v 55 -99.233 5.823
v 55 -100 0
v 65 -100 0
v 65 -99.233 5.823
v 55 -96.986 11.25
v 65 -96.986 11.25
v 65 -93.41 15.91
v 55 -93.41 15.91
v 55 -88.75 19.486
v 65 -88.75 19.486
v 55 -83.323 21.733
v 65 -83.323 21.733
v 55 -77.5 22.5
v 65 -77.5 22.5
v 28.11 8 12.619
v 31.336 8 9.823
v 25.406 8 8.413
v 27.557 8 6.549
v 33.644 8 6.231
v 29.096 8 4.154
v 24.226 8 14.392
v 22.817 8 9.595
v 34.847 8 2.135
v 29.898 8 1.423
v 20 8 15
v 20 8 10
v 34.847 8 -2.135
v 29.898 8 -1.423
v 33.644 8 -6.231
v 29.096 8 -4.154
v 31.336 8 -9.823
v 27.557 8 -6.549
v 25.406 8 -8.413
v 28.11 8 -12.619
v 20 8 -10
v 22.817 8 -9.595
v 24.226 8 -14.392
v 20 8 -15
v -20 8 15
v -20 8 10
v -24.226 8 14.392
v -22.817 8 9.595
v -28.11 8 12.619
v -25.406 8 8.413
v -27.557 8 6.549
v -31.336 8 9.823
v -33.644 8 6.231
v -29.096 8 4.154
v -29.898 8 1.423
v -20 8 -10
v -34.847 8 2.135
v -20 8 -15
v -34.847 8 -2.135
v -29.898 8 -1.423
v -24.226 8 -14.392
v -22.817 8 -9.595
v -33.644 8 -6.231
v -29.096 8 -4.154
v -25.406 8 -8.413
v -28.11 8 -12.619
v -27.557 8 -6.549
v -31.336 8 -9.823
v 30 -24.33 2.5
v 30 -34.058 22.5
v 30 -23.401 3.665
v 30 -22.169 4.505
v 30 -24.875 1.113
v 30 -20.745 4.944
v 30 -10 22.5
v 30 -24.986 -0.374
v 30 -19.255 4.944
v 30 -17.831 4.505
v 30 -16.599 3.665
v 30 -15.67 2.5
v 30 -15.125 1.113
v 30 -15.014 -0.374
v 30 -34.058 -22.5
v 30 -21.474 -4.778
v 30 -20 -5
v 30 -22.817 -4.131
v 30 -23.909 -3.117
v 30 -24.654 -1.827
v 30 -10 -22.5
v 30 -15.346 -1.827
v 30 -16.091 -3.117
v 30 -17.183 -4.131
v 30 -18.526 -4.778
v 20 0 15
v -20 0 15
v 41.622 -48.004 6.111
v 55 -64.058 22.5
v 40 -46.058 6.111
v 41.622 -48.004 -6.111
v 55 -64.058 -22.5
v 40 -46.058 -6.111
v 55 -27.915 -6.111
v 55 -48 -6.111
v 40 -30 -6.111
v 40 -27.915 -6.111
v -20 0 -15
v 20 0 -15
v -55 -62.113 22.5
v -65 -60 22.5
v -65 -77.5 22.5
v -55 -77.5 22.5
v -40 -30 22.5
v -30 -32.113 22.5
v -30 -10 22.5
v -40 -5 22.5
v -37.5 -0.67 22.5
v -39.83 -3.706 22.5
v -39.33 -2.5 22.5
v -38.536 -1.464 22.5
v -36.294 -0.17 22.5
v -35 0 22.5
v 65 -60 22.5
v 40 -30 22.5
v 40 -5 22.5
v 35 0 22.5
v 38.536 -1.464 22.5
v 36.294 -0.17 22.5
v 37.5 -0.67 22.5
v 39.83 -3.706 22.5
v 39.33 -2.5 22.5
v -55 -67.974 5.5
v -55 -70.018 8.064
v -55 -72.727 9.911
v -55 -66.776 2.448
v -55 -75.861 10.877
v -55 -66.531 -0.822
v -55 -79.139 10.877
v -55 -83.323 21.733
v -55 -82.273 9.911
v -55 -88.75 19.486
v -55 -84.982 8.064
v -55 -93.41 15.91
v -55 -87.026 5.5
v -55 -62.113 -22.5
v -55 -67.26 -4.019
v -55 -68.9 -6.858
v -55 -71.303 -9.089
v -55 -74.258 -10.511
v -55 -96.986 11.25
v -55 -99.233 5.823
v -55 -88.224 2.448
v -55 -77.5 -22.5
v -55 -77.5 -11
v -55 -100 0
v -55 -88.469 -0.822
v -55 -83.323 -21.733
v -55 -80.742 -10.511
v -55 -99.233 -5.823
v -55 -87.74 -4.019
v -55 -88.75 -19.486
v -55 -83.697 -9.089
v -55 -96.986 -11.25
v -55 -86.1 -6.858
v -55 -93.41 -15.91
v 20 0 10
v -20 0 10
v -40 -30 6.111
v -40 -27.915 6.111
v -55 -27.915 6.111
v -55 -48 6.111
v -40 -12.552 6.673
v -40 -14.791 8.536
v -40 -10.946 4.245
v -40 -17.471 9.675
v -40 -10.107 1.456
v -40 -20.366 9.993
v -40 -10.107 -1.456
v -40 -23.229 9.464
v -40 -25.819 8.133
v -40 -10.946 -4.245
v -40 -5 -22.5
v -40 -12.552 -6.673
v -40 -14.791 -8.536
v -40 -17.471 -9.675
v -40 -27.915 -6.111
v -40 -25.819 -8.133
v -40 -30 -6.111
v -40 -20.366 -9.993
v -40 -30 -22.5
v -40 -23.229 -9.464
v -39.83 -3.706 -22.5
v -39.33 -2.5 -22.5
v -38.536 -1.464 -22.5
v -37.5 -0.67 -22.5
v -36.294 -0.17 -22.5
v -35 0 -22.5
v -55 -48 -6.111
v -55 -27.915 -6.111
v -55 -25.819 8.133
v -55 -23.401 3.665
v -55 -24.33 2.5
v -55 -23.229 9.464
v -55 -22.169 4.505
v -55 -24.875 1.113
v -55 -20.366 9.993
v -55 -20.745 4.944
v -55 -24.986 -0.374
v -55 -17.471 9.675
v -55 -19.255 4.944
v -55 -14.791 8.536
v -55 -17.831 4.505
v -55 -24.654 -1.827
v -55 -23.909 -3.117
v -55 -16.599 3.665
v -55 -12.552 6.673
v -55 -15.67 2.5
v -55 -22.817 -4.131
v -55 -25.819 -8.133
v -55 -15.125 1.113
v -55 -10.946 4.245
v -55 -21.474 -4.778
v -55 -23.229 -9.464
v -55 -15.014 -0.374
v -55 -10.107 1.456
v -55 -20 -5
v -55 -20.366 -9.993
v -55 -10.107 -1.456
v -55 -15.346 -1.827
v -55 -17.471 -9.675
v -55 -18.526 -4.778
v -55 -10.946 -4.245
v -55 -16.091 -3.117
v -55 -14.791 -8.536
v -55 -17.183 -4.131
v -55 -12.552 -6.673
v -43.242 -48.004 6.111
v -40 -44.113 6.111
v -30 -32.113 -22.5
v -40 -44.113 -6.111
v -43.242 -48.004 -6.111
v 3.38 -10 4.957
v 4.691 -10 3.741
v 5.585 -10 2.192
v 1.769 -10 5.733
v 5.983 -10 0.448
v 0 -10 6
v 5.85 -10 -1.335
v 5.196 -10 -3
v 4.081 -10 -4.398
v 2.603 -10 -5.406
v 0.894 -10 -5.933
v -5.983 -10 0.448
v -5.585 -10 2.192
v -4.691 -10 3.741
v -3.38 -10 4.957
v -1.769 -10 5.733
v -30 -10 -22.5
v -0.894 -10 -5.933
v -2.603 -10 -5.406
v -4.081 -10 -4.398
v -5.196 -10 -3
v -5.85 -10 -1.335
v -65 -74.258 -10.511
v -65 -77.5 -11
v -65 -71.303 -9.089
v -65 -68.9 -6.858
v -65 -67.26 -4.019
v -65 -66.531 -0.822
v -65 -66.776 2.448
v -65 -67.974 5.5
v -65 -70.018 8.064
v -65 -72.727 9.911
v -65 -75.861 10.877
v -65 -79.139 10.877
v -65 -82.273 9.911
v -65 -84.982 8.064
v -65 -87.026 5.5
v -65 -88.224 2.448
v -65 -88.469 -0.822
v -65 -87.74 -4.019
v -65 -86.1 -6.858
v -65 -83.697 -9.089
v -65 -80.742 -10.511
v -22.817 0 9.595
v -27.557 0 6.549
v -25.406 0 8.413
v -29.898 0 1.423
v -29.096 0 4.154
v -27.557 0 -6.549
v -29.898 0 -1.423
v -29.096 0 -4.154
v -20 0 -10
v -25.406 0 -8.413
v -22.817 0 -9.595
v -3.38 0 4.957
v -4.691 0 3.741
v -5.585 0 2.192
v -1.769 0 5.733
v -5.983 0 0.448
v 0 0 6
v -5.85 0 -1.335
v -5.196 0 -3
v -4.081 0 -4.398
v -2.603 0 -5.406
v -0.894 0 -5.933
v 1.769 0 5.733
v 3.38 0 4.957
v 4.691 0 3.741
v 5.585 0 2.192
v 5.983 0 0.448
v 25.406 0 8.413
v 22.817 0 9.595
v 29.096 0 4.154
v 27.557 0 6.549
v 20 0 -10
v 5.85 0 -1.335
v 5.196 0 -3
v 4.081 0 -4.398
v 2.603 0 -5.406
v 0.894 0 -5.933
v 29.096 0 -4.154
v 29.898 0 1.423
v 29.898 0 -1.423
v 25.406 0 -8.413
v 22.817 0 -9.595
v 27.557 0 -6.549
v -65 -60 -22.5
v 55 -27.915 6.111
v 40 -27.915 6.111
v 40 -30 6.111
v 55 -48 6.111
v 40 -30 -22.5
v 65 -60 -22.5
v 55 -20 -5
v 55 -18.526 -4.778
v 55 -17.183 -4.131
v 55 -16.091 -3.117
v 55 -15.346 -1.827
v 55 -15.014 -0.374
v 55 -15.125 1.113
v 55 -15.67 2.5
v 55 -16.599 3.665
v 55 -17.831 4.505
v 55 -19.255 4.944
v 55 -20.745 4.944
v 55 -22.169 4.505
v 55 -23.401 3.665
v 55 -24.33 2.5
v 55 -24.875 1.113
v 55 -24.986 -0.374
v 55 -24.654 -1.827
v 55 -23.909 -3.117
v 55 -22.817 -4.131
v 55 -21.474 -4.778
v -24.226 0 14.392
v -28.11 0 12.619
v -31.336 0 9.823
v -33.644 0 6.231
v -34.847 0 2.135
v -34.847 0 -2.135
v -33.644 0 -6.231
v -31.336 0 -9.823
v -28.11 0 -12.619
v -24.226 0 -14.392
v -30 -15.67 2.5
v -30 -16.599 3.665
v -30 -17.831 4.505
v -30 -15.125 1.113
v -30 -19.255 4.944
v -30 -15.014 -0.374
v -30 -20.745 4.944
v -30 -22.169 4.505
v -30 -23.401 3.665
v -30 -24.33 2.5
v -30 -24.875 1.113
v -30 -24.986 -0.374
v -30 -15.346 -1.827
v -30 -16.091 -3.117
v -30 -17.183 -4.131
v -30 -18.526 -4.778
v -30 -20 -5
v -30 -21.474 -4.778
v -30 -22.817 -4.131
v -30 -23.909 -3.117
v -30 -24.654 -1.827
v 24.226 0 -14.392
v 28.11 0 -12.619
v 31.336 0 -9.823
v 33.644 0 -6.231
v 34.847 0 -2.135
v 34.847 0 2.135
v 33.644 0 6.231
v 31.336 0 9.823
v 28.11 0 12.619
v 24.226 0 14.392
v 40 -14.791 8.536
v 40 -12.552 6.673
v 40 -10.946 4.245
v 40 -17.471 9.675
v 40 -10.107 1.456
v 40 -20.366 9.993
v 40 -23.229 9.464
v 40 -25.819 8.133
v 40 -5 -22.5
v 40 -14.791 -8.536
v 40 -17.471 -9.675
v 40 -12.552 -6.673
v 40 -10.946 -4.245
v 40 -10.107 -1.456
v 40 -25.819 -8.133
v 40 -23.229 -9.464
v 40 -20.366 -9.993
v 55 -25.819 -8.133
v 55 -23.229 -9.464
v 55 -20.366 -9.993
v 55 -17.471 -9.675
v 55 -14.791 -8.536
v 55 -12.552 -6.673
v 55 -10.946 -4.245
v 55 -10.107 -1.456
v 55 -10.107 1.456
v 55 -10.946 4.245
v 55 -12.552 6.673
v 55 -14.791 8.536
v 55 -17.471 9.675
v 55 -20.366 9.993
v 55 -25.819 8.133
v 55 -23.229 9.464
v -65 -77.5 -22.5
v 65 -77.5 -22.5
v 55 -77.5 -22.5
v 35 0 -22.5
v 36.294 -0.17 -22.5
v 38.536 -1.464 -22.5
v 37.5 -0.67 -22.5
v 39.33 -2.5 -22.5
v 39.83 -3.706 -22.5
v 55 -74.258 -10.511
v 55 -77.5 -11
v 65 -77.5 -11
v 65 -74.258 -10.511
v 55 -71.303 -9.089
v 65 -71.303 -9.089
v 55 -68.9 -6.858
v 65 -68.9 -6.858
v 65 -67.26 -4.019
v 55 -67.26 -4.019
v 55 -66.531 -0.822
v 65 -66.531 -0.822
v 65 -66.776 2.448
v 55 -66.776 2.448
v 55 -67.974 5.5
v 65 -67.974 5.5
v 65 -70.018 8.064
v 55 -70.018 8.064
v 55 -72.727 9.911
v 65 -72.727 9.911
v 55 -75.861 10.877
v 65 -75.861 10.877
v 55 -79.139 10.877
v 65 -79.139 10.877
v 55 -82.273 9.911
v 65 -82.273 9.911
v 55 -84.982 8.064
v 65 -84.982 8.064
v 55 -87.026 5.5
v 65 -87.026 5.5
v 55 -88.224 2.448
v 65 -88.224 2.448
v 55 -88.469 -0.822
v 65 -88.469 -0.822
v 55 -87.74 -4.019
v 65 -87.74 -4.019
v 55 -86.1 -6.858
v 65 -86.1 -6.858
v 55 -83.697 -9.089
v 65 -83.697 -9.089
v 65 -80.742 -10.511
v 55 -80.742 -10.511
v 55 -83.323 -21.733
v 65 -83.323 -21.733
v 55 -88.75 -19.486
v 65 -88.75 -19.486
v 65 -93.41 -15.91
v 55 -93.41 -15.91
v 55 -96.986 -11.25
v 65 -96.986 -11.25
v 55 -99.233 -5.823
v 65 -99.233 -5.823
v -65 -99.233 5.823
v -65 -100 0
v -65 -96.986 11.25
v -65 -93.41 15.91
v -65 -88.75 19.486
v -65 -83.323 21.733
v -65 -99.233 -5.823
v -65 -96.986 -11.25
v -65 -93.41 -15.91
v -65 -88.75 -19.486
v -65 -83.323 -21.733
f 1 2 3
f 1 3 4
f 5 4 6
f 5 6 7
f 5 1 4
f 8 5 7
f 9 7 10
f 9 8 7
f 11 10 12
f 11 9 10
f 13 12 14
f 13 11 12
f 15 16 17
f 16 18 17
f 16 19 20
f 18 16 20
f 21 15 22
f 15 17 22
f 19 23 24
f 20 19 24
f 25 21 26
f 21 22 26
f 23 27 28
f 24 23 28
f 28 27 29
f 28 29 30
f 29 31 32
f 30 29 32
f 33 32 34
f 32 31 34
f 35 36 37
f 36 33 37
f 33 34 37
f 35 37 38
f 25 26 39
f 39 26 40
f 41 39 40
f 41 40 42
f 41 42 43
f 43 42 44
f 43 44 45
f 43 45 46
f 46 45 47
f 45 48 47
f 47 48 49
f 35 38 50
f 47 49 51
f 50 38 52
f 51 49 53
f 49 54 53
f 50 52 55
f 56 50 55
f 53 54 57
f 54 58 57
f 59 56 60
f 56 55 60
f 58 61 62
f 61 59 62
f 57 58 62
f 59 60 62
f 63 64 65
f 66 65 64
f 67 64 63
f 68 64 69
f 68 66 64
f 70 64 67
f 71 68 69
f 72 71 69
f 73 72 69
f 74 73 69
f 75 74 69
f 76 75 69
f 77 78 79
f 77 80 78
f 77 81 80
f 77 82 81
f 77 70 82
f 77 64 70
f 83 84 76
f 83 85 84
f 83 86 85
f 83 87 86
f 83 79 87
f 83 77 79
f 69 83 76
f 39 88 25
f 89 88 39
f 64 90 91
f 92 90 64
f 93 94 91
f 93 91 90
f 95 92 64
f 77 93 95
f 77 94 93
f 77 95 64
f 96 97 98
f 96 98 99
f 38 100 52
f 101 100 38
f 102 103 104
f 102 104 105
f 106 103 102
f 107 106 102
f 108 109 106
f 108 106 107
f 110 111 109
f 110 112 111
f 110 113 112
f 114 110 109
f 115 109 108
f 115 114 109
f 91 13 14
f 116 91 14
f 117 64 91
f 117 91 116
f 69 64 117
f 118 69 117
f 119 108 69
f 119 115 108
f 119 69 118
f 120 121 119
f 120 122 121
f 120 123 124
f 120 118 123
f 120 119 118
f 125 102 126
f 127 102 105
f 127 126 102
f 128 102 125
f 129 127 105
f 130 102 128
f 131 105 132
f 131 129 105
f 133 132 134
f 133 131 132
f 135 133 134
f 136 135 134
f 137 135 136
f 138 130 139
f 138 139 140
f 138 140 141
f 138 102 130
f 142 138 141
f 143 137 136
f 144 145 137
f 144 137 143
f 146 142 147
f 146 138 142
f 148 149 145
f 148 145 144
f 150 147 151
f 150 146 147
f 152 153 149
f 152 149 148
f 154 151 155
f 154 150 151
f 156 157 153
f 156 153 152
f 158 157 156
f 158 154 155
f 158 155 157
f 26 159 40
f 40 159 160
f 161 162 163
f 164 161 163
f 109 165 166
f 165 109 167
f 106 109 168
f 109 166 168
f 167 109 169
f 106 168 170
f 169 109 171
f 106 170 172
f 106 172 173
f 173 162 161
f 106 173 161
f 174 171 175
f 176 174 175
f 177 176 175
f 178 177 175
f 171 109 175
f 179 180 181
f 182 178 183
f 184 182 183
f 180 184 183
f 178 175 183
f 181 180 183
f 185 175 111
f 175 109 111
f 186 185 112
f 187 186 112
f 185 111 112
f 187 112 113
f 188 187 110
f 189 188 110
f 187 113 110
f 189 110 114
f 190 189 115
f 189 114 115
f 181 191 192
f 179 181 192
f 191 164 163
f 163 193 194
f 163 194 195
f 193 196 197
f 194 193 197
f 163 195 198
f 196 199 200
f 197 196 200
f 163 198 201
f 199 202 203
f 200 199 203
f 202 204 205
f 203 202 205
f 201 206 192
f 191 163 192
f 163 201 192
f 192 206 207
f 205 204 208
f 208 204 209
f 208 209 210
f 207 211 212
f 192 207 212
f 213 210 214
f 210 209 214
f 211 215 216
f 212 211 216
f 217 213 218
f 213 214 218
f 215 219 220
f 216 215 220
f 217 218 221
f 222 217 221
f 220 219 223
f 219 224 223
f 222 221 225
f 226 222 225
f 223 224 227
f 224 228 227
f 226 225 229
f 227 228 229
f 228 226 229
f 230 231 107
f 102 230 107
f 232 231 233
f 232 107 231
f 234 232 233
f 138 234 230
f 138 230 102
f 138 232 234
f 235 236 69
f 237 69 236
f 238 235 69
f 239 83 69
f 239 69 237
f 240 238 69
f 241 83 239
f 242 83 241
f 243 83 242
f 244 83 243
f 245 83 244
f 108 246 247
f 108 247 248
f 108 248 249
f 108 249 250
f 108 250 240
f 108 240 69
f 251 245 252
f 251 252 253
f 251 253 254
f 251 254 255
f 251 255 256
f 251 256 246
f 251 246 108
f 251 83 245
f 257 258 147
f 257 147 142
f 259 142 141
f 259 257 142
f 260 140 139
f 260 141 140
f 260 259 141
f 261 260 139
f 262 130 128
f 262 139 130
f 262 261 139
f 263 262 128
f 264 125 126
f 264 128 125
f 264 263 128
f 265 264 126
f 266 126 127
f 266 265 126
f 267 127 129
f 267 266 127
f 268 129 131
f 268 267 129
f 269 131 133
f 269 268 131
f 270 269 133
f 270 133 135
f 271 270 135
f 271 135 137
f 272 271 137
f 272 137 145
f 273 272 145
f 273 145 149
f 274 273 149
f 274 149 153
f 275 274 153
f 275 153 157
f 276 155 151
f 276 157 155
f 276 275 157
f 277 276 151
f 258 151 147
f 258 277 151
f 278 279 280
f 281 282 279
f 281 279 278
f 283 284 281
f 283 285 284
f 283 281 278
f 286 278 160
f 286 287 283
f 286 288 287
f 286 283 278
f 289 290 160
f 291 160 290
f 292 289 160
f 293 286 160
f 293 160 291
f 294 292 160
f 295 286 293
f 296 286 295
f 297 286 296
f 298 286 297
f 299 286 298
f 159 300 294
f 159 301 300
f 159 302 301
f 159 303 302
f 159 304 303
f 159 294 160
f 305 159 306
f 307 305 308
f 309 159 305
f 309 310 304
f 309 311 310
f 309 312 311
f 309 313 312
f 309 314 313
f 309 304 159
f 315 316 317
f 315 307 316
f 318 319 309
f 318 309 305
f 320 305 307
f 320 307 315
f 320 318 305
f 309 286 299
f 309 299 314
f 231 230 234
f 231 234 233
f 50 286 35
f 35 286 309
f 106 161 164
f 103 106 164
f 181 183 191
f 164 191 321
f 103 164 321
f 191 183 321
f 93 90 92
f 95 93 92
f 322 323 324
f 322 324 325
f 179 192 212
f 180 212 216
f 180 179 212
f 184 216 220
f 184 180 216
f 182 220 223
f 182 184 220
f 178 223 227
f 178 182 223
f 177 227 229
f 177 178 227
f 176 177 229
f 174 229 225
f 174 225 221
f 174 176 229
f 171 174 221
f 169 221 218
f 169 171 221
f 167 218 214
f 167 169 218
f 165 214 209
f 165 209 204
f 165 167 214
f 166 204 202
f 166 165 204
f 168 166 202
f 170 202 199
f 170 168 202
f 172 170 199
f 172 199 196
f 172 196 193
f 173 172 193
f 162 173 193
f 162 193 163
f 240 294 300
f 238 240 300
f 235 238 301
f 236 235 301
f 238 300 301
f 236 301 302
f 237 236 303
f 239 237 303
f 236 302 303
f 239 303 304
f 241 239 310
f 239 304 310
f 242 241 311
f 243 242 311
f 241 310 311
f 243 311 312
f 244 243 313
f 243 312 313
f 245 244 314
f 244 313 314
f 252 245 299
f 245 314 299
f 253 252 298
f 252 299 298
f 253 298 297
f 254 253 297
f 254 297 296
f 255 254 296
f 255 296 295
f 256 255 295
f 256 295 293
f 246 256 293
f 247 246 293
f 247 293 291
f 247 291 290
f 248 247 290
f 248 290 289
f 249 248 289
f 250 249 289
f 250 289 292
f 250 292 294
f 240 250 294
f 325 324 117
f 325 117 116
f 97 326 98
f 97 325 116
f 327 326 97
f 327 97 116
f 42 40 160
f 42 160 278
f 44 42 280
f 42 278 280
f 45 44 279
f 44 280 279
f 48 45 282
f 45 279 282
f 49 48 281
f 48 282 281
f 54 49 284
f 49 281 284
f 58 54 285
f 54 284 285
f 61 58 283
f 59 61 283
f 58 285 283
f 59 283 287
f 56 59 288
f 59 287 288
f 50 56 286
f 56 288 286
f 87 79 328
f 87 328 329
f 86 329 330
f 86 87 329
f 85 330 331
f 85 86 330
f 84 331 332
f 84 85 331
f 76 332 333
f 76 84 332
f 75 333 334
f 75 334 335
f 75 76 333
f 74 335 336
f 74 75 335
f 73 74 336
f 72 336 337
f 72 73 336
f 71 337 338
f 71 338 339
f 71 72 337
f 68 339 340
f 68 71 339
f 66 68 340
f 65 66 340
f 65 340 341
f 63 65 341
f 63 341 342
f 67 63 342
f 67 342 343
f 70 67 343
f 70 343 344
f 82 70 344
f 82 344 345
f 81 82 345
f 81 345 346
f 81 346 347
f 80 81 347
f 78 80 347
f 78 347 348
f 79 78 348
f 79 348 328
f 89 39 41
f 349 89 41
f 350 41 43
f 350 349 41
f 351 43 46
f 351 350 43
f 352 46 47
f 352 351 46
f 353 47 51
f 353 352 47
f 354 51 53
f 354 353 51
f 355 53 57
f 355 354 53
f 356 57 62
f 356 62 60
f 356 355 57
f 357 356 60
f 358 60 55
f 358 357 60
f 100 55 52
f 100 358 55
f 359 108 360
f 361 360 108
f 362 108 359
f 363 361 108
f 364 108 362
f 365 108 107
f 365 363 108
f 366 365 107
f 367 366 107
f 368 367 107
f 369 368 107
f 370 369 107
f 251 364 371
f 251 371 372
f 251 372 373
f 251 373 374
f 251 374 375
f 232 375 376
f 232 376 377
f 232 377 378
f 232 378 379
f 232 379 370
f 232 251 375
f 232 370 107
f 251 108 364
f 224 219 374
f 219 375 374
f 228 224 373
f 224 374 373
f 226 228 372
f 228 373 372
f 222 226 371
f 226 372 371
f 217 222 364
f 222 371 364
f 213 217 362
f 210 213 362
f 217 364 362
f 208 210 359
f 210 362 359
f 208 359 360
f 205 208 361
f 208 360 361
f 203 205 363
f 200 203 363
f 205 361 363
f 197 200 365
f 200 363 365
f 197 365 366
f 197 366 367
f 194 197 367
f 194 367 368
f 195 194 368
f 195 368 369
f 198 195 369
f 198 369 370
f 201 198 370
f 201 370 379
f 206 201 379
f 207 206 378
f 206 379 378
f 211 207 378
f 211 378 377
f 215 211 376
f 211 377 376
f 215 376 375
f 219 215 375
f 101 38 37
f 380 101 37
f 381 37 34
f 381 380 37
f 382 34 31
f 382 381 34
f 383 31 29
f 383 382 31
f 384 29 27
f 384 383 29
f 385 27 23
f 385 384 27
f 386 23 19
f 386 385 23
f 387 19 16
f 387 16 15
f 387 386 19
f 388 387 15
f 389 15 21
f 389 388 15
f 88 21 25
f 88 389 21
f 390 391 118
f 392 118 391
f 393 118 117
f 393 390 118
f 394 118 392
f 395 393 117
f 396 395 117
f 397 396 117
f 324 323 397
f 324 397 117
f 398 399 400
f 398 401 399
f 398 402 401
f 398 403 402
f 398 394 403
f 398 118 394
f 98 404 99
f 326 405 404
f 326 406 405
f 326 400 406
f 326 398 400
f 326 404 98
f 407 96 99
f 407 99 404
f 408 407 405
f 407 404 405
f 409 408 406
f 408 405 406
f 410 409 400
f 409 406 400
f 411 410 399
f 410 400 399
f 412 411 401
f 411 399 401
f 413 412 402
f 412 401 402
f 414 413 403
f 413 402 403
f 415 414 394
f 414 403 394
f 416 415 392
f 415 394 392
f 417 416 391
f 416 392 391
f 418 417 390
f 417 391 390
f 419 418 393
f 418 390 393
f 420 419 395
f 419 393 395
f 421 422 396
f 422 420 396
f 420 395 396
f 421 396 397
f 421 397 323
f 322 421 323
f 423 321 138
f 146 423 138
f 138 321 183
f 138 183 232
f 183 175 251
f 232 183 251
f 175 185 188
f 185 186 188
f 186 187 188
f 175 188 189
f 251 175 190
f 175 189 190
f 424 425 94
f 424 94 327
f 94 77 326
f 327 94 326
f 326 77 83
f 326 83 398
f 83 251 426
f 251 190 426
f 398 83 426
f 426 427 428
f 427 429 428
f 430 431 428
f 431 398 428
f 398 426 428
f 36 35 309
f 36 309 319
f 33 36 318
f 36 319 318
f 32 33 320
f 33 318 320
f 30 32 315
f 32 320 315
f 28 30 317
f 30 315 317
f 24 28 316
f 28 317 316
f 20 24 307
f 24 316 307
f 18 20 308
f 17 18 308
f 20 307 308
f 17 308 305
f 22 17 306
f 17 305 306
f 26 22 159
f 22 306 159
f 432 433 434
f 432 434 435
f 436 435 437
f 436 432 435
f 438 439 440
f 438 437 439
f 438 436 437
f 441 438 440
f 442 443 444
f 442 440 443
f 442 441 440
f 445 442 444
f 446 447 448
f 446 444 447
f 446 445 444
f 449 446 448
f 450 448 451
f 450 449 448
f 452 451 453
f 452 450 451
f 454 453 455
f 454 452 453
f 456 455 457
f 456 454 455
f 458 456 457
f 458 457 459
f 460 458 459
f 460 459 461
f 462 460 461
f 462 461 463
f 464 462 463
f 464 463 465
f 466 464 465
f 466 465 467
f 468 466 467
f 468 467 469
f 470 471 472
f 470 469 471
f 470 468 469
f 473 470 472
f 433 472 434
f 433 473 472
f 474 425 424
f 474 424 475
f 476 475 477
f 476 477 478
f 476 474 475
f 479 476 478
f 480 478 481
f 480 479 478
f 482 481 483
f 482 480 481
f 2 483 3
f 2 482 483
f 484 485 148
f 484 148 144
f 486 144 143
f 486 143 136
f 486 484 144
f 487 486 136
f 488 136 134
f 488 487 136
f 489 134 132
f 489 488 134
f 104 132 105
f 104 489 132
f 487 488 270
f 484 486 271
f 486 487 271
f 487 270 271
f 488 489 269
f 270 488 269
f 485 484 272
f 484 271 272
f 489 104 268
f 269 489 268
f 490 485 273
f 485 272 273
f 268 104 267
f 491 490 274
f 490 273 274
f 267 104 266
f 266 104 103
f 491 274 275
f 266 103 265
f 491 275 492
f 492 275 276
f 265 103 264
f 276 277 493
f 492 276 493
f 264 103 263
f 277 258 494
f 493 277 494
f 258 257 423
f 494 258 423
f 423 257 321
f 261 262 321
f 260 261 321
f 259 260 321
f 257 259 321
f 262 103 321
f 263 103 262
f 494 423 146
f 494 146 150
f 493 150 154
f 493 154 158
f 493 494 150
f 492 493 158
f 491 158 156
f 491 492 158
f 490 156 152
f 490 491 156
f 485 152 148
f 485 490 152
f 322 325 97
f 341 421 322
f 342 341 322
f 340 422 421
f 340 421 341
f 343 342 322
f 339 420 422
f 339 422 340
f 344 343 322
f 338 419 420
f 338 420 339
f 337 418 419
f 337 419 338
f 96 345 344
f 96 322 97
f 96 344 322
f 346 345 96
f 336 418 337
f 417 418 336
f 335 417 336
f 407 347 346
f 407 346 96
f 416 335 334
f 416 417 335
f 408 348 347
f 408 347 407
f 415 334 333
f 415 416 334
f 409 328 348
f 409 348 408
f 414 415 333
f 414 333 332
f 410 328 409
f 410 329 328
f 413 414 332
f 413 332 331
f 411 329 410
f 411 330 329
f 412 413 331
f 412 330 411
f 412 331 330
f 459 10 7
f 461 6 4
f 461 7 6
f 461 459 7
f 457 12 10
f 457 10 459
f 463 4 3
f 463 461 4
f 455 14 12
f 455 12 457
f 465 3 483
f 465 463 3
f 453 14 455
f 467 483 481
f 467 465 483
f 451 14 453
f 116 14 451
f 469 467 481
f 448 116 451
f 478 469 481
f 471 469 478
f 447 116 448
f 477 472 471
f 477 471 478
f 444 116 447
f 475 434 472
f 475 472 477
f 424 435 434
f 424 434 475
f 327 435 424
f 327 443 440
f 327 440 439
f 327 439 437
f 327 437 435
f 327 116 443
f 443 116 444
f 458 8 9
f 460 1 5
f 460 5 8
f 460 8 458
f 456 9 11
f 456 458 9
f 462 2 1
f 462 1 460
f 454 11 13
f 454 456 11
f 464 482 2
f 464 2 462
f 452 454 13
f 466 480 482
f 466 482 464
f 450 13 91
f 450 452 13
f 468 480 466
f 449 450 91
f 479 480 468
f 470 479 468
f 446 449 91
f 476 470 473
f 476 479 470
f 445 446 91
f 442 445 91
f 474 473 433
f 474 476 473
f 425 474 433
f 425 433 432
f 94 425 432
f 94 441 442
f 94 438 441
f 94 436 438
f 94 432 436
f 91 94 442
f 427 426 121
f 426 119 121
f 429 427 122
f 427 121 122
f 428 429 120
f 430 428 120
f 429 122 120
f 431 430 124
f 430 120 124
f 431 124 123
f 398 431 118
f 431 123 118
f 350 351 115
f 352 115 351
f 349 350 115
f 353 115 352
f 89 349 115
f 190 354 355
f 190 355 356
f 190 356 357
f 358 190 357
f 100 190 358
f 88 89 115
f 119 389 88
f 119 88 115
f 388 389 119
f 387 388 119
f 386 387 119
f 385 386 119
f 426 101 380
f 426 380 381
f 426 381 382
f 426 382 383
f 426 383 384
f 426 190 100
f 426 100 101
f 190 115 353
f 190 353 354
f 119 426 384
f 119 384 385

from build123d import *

# Parameters (mm, degrees)
SKETCH3_W               = 130
SKETCH3_H               = 45
BOSS_EXTRUDE1_DEPTH     = 100
CUT_EXTRUDE1_DEPTH      = 122.372360939
CUT_EXTRUDE1_DEPTH_BACK = 122.372360939
BOSS_EXTRUDE2_DEPTH     = 8
CUT_EXTRUDE2_DEPTH      = 122.372360939
CUT_EXTRUDE2_DEPTH_BACK = 122.372360939
CUT_EXTRUDE3_DEPTH      = 122.372360939
CUT_EXTRUDE3_DEPTH_BACK = 122.372360939
CUT_EXTRUDE4_DEPTH      = 122.372360939
CUT_EXTRUDE4_DEPTH_BACK = 122.372360939
FILLET3_R               = 5
SKETCH16_R              = 10
SKETCH16_R_2            = 5
BOSS_EXTRUDE3_DEPTH     = 15
SKETCH19_R              = 6
CUT_EXTRUDE5_DEPTH      = 122.372360939
CUT_EXTRUDE6_DEPTH      = 147.735305908
CUT_EXTRUDE6_DEPTH_BACK = 147.735305908
SKETCH23_R              = 5
CUT_EXTRUDE7_DEPTH      = 15
CUT_EXTRUDE8_DEPTH      = 15
CUT_EXTRUDE9_DEPTH      = 166.548331311
CUT_EXTRUDE9_DEPTH_BACK = 166.548331311
SKETCH28_R              = 11


with BuildPart() as part:
    # Sketch3 → Boss-Extrude1 (new body)
    with BuildSketch(Plane(origin=(0, 0, 0), x_dir=(1, 0, 0), z_dir=(0, 1, 0))):
        Rectangle(SKETCH3_W, SKETCH3_H)
    extrude(amount=-BOSS_EXTRUDE1_DEPTH)

    # Sketch5 → Cut-Extrude1 (cut, two sides: drawn at the far end of the back side and taken through both)
    with BuildSketch(Plane.XY.offset(-CUT_EXTRUDE1_DEPTH_BACK)):
        Polygon((-65, 0), (-40, 0), (-40, -30), (-65, -60), align=None)
        Polygon((65, 0), (40, 0), (40, -30), (65, -60), align=None)
    extrude(amount=CUT_EXTRUDE1_DEPTH + CUT_EXTRUDE1_DEPTH_BACK, mode=Mode.SUBTRACT)

    # Sketch7 → Boss-Extrude2 (add)
    with BuildSketch(Plane(origin=(0, 0, 0), x_dir=(1, 0, 0), z_dir=(0, 1, 0))):
        with BuildLine():
            Line((-20, 15), (20, 15))
            ThreePointArc((20, 15), (35, 0), (20, -15))
            Line((20, -15), (-20, -15))
            ThreePointArc((-20, -15), (-35, 0), (-20, 15))
        make_face()
        with BuildLine():
            Line((-20, 10), (20, 10))
            ThreePointArc((20, 10), (30, 0), (20, -10))
            Line((20, -10), (-20, -10))
            ThreePointArc((-20, -10), (-30, 0), (-20, 10))
        make_face(mode=Mode.SUBTRACT)
    extrude(amount=BOSS_EXTRUDE2_DEPTH)

    # Sketch9 → Cut-Extrude2 (cut, two sides: drawn at the far end of the back side and taken through both)
    with BuildSketch(Plane.XY.offset(-CUT_EXTRUDE2_DEPTH_BACK)):
        Polygon((-30, -32.113231403), (-55, -62.113231403), (-55, -100), (55, -100), (55, -64.057510222), (30, -34.057510222), (30, -10), (-30, -10), align=None)
    extrude(amount=CUT_EXTRUDE2_DEPTH + CUT_EXTRUDE2_DEPTH_BACK, mode=Mode.SUBTRACT)

    # Sketch11 → Cut-Extrude3 (cut, two sides: drawn at the far end of the back side and taken through both)
    with BuildSketch(Plane(origin=(0, 0, 0), x_dir=(0, 0, -1), z_dir=(1, 0, 0)).offset(-CUT_EXTRUDE3_DEPTH_BACK)):
        with BuildLine():
            Line((-22.5, -100), (0, -100))
            ThreePointArc((0, -100), (-15.909902577, -93.409902577), (-22.5, -77.5))
            Line((-22.5, -77.5), (-22.5, -100))
        make_face()
    extrude(amount=CUT_EXTRUDE3_DEPTH + CUT_EXTRUDE3_DEPTH_BACK, mode=Mode.SUBTRACT)

    # Sketch12 → Cut-Extrude4 (cut, two sides: drawn at the far end of the back side and taken through both)
    with BuildSketch(Plane(origin=(0, 0, 0), x_dir=(0, 0, -1), z_dir=(1, 0, 0)).offset(-CUT_EXTRUDE4_DEPTH_BACK)):
        with BuildLine():
            Line((22.5, -100), (22.5, -77.5))
            ThreePointArc((22.5, -77.5), (15.909902577, -93.409902577), (0, -100))
            Line((0, -100), (22.5, -100))
        make_face()
    extrude(amount=CUT_EXTRUDE4_DEPTH + CUT_EXTRUDE4_DEPTH_BACK, mode=Mode.SUBTRACT)

    # Fillet3
    fillet3_edges = [part.edges().sort_by_distance(p)[0] for p in [
        (-40, 0, 0),
        (40, 0, 0),
    ]]
    fillet(fillet3_edges, radius=FILLET3_R - 0.0001)  # a hair under: the kernel refuses the full size

    # Sketch16 → Boss-Extrude3 (add)
    # profile 1 of 4: a face of its own
    with BuildSketch(Plane(origin=(40, 0, 0), x_dir=(0, 0, -1), z_dir=(1, 0, 0))):
        with Locations((0, -20)):
            Circle(SKETCH16_R)
        with Locations((0, -20)):
            Circle(SKETCH16_R_2, mode=Mode.SUBTRACT)
    # profile 2 of 4: a face of its own
    with BuildSketch(Plane(origin=(40, 0, 0), x_dir=(0, 0, -1), z_dir=(1, 0, 0))):
        with BuildLine():
            Line((1.3e-08, -30), (6.111197294, -30))
            Line((6.111197294, -30), (6.111197294, -27.915381711))
            ThreePointArc((6.111197294, -27.915381711), (3.228481297, -29.464507833), (1.3e-08, -30))
        make_face()
    # profile 3 of 4: a face of its own
    with BuildSketch(Plane(origin=(40, 0, 0), x_dir=(0, 0, -1), z_dir=(1, 0, 0))):
        with BuildLine():
            Line((-6.111197294, -27.915381711), (-6.111197294, -30))
            Line((-6.111197294, -30), (1.3e-08, -30))
            ThreePointArc((1.3e-08, -30), (-3.228481284, -29.464507837), (-6.111197294, -27.915381711))
        make_face()
    # profile 4 of 4: a face of its own
    with BuildSketch(Plane(origin=(40, 0, 0), x_dir=(0, 0, -1), z_dir=(1, 0, 0))):
        Polygon((-6.111197294, -30), (-6.111197294, -48.004109964), (6.111197294, -48.004109964), (6.111197294, -30), (1.3e-08, -30), align=None)
    boss_extrude3 = extrude(amount=BOSS_EXTRUDE3_DEPTH)

    # Mirror4: Boss-Extrude3 across plane
    add(boss_extrude3.mirror(Plane(origin=(0, 0, 0), x_dir=(0, 0, 1), z_dir=(1, 0, 0))))

    # Sketch19 → Cut-Extrude5 (cut, through all)
    with BuildSketch(Plane(origin=(0, 0, 0), x_dir=(1, 0, 0), z_dir=(0, 1, 0))):
        with Locations(Location((0, 0, 0), (0, 0, 270))):
            Circle(SKETCH19_R)
    extrude(amount=-CUT_EXTRUDE5_DEPTH, mode=Mode.SUBTRACT)

    # Sketch23 → Cut-Extrude6 (cut, two sides: drawn at the far end of the back side and taken through both)
    with BuildSketch(Plane(origin=(40, 0, 0), x_dir=(0, 0, -1), z_dir=(1, 0, 0)).offset(-CUT_EXTRUDE6_DEPTH_BACK)):
        with Locations((0, -20)):
            Circle(SKETCH23_R)
    extrude(amount=CUT_EXTRUDE6_DEPTH + CUT_EXTRUDE6_DEPTH_BACK, mode=Mode.SUBTRACT)

    # Sketch26 → Cut-Extrude7 (cut)
    with BuildSketch(Plane.XY.offset(6.111197294)):
        Polygon((-40, -44.113231403), (-40, -48.004109964), (-43.2423988, -48.004109964), align=None)
    extrude(amount=-CUT_EXTRUDE7_DEPTH, mode=Mode.SUBTRACT)

    # Sketch27 → Cut-Extrude8 (cut)
    with BuildSketch(Plane.XY.offset(6.111197294)):
        Polygon((40, -46.057510222), (40, -48.004109964), (41.622166452, -48.004109964), align=None)
    extrude(amount=-CUT_EXTRUDE8_DEPTH, mode=Mode.SUBTRACT)

    # Sketch28 → Cut-Extrude9 (cut, two sides: drawn at the far end of the back side and taken through both)
    with BuildSketch(Plane(origin=(65, 0, 0), x_dir=(0, 0, -1), z_dir=(1, 0, 0)).offset(-CUT_EXTRUDE9_DEPTH_BACK)):
        with Locations((0, -77.5)):
            Circle(SKETCH28_R)
    extrude(amount=CUT_EXTRUDE9_DEPTH + CUT_EXTRUDE9_DEPTH_BACK, mode=Mode.SUBTRACT)


solid = part.part
